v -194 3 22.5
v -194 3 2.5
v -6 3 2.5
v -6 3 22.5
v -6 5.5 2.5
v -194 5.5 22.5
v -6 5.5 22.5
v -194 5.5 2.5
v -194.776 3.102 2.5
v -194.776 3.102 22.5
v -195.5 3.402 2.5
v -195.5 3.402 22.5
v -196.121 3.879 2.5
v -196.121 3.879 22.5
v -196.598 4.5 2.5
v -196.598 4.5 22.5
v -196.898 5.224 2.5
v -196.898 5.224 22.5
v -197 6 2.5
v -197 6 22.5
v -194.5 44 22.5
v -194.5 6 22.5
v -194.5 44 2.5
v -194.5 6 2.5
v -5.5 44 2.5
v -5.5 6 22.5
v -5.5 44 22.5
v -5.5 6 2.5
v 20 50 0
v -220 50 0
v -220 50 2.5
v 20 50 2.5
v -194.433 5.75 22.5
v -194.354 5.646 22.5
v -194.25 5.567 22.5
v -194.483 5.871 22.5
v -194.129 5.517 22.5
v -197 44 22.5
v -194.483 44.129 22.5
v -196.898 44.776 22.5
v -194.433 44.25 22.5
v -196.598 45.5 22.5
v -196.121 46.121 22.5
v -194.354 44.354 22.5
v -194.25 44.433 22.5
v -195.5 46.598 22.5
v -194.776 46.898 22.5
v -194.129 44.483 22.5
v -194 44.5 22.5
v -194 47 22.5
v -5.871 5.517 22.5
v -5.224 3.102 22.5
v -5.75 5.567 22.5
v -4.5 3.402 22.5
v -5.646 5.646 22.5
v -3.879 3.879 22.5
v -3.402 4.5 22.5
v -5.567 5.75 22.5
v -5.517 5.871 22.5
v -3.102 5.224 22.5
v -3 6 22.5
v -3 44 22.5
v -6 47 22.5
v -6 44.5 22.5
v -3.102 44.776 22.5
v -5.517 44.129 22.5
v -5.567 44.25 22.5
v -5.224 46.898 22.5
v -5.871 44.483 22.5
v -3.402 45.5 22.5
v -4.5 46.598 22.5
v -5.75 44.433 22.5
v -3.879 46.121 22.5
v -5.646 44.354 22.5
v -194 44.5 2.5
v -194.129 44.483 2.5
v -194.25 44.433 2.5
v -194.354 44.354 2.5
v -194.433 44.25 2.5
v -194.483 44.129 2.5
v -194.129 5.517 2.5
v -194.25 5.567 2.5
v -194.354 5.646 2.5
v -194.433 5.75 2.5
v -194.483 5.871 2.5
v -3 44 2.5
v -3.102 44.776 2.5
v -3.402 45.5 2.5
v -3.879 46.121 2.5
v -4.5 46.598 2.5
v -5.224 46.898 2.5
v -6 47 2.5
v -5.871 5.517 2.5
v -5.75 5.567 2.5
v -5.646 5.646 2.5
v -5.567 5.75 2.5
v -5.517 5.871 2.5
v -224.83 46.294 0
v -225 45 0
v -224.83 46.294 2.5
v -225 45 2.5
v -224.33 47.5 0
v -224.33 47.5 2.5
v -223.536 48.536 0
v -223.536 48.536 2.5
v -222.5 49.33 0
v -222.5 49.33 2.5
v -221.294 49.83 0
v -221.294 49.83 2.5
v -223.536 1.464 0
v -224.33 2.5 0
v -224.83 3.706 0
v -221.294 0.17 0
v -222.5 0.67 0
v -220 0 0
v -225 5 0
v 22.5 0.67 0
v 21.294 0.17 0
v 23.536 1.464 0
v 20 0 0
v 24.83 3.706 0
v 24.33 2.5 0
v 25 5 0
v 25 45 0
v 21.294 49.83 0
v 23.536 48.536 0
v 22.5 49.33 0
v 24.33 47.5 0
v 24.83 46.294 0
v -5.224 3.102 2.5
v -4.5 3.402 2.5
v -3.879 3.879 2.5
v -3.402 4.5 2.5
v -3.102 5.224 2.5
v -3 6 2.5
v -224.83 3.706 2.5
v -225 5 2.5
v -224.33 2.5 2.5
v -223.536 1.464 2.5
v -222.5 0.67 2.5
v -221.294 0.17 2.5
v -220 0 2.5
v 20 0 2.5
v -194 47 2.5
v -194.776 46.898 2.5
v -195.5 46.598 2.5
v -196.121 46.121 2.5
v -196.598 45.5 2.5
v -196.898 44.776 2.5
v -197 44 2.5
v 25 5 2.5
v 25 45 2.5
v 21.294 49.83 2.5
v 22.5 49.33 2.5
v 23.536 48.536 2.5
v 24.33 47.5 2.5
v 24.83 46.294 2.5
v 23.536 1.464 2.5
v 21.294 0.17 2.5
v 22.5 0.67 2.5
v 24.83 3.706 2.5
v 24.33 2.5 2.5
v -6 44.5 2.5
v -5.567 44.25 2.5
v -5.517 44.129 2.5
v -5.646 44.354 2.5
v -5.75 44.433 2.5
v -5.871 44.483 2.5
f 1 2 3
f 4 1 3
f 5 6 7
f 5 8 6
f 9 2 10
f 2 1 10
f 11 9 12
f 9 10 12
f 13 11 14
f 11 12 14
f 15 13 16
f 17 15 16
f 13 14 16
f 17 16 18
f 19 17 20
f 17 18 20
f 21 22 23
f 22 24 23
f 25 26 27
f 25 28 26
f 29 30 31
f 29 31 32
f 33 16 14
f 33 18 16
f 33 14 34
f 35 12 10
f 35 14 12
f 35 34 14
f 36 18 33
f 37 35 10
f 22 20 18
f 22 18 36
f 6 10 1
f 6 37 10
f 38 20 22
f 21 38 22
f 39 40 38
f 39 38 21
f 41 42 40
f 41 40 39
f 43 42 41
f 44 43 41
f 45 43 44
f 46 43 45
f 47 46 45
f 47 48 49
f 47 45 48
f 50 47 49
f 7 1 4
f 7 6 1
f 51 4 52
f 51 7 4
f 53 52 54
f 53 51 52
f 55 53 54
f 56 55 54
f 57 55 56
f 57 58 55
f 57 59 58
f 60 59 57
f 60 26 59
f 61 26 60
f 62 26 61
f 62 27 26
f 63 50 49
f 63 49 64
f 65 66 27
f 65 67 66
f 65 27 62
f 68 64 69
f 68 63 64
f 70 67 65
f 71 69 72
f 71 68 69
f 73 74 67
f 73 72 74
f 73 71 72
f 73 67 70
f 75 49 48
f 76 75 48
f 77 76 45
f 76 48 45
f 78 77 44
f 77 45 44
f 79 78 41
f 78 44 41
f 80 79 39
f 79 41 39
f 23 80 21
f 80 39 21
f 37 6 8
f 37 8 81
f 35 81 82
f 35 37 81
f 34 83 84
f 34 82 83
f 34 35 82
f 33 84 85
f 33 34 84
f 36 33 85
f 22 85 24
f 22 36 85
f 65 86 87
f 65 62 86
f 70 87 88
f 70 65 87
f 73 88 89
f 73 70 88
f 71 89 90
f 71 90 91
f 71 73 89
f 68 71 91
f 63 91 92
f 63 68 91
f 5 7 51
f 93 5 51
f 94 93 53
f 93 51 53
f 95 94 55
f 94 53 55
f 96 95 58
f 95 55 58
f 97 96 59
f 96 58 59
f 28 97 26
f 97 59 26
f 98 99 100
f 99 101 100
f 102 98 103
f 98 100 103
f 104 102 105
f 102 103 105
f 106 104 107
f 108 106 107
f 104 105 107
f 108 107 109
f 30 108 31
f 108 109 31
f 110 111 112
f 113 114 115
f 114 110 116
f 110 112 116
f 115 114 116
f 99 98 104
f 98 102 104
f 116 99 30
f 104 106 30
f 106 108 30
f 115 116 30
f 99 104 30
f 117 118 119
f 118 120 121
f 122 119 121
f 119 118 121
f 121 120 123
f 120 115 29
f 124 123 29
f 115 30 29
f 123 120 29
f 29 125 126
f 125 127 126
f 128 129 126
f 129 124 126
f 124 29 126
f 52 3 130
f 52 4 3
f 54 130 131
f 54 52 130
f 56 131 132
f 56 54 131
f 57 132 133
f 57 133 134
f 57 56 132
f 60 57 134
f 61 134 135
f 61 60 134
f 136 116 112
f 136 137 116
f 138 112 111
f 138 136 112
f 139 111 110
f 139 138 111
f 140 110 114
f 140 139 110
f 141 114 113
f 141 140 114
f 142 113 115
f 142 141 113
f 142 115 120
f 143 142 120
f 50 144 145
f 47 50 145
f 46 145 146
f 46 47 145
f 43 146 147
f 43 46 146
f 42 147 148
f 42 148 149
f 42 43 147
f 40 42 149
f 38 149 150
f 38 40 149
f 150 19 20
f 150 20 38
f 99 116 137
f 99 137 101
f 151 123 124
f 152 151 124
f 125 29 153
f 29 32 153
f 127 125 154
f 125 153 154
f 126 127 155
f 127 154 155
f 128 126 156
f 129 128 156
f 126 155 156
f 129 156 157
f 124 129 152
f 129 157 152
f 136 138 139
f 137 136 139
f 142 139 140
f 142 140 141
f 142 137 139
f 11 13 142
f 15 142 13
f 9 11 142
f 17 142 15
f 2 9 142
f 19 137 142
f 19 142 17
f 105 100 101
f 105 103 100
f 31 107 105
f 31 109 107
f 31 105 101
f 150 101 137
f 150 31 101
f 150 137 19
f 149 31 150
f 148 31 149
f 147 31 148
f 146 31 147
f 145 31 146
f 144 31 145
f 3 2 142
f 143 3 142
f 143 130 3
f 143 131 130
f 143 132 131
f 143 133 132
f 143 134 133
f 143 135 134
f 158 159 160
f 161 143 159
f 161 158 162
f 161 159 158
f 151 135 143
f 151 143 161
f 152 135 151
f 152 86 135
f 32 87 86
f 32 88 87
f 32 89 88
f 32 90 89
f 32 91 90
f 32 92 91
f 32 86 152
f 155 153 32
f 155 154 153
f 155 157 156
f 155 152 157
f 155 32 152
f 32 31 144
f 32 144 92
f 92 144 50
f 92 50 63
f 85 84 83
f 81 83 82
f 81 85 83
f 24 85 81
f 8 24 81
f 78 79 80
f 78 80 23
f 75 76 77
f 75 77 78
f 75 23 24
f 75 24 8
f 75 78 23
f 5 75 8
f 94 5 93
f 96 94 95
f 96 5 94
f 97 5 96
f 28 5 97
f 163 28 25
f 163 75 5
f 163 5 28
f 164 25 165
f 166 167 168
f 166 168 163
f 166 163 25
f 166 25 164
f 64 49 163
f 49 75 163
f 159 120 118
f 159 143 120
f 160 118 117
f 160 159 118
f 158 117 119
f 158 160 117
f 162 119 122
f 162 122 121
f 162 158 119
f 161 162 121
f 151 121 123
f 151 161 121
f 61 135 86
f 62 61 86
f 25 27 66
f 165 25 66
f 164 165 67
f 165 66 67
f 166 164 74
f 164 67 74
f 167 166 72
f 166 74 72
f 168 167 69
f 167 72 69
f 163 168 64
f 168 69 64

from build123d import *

# Parameters (mm, degrees)
F0_W     = 250
F0_H     = 50
F1_DEPTH = 2.5
F2_W     = 194
F2_H     = 44
F3_DEPTH = 20
F4_R     = 3
F5_T     = -2.5
F6_R     = 5


with BuildPart() as f1:
    # F0 (on Top) → F1 (new body)
    with BuildSketch(Plane.XY):
        with Locations((-100, 25)):
            Rectangle(F0_W, F0_H)
    extrude(amount=F1_DEPTH)

    # F2 (on face) → F3 (join)
    with BuildSketch(Plane.XY.offset(2.5)):
        with Locations((-100, 25)):
            Rectangle(F2_W, F2_H)
    extrude(amount=F3_DEPTH)

    # F4
    f4_edges = [f1.edges().sort_by_distance(p)[0] for p in [
        (-197, 3, 12.5),
        (-3, 3, 12.5),
        (-3, 47, 12.5),
        (-197, 47, 12.5),
    ]]
    fillet(f4_edges, radius=F4_R)

    # F5
    f5_openings = [f1.faces().sort_by_distance(p)[0] for p in [
        (-100, 25, 22.5),
    ]]
    offset(amount=F5_T, openings=f5_openings, kind=Kind.INTERSECTION)

    # F6
    f6_edges = [f1.edges().sort_by_distance(p)[0] for p in [
        (25, 0, 1.25),
        (25, 50, 1.25),
        (-225, 50, 1.25),
        (-225, 0, 1.25),
    ]]
    fillet(f6_edges, radius=F6_R)


solid = f1.part
